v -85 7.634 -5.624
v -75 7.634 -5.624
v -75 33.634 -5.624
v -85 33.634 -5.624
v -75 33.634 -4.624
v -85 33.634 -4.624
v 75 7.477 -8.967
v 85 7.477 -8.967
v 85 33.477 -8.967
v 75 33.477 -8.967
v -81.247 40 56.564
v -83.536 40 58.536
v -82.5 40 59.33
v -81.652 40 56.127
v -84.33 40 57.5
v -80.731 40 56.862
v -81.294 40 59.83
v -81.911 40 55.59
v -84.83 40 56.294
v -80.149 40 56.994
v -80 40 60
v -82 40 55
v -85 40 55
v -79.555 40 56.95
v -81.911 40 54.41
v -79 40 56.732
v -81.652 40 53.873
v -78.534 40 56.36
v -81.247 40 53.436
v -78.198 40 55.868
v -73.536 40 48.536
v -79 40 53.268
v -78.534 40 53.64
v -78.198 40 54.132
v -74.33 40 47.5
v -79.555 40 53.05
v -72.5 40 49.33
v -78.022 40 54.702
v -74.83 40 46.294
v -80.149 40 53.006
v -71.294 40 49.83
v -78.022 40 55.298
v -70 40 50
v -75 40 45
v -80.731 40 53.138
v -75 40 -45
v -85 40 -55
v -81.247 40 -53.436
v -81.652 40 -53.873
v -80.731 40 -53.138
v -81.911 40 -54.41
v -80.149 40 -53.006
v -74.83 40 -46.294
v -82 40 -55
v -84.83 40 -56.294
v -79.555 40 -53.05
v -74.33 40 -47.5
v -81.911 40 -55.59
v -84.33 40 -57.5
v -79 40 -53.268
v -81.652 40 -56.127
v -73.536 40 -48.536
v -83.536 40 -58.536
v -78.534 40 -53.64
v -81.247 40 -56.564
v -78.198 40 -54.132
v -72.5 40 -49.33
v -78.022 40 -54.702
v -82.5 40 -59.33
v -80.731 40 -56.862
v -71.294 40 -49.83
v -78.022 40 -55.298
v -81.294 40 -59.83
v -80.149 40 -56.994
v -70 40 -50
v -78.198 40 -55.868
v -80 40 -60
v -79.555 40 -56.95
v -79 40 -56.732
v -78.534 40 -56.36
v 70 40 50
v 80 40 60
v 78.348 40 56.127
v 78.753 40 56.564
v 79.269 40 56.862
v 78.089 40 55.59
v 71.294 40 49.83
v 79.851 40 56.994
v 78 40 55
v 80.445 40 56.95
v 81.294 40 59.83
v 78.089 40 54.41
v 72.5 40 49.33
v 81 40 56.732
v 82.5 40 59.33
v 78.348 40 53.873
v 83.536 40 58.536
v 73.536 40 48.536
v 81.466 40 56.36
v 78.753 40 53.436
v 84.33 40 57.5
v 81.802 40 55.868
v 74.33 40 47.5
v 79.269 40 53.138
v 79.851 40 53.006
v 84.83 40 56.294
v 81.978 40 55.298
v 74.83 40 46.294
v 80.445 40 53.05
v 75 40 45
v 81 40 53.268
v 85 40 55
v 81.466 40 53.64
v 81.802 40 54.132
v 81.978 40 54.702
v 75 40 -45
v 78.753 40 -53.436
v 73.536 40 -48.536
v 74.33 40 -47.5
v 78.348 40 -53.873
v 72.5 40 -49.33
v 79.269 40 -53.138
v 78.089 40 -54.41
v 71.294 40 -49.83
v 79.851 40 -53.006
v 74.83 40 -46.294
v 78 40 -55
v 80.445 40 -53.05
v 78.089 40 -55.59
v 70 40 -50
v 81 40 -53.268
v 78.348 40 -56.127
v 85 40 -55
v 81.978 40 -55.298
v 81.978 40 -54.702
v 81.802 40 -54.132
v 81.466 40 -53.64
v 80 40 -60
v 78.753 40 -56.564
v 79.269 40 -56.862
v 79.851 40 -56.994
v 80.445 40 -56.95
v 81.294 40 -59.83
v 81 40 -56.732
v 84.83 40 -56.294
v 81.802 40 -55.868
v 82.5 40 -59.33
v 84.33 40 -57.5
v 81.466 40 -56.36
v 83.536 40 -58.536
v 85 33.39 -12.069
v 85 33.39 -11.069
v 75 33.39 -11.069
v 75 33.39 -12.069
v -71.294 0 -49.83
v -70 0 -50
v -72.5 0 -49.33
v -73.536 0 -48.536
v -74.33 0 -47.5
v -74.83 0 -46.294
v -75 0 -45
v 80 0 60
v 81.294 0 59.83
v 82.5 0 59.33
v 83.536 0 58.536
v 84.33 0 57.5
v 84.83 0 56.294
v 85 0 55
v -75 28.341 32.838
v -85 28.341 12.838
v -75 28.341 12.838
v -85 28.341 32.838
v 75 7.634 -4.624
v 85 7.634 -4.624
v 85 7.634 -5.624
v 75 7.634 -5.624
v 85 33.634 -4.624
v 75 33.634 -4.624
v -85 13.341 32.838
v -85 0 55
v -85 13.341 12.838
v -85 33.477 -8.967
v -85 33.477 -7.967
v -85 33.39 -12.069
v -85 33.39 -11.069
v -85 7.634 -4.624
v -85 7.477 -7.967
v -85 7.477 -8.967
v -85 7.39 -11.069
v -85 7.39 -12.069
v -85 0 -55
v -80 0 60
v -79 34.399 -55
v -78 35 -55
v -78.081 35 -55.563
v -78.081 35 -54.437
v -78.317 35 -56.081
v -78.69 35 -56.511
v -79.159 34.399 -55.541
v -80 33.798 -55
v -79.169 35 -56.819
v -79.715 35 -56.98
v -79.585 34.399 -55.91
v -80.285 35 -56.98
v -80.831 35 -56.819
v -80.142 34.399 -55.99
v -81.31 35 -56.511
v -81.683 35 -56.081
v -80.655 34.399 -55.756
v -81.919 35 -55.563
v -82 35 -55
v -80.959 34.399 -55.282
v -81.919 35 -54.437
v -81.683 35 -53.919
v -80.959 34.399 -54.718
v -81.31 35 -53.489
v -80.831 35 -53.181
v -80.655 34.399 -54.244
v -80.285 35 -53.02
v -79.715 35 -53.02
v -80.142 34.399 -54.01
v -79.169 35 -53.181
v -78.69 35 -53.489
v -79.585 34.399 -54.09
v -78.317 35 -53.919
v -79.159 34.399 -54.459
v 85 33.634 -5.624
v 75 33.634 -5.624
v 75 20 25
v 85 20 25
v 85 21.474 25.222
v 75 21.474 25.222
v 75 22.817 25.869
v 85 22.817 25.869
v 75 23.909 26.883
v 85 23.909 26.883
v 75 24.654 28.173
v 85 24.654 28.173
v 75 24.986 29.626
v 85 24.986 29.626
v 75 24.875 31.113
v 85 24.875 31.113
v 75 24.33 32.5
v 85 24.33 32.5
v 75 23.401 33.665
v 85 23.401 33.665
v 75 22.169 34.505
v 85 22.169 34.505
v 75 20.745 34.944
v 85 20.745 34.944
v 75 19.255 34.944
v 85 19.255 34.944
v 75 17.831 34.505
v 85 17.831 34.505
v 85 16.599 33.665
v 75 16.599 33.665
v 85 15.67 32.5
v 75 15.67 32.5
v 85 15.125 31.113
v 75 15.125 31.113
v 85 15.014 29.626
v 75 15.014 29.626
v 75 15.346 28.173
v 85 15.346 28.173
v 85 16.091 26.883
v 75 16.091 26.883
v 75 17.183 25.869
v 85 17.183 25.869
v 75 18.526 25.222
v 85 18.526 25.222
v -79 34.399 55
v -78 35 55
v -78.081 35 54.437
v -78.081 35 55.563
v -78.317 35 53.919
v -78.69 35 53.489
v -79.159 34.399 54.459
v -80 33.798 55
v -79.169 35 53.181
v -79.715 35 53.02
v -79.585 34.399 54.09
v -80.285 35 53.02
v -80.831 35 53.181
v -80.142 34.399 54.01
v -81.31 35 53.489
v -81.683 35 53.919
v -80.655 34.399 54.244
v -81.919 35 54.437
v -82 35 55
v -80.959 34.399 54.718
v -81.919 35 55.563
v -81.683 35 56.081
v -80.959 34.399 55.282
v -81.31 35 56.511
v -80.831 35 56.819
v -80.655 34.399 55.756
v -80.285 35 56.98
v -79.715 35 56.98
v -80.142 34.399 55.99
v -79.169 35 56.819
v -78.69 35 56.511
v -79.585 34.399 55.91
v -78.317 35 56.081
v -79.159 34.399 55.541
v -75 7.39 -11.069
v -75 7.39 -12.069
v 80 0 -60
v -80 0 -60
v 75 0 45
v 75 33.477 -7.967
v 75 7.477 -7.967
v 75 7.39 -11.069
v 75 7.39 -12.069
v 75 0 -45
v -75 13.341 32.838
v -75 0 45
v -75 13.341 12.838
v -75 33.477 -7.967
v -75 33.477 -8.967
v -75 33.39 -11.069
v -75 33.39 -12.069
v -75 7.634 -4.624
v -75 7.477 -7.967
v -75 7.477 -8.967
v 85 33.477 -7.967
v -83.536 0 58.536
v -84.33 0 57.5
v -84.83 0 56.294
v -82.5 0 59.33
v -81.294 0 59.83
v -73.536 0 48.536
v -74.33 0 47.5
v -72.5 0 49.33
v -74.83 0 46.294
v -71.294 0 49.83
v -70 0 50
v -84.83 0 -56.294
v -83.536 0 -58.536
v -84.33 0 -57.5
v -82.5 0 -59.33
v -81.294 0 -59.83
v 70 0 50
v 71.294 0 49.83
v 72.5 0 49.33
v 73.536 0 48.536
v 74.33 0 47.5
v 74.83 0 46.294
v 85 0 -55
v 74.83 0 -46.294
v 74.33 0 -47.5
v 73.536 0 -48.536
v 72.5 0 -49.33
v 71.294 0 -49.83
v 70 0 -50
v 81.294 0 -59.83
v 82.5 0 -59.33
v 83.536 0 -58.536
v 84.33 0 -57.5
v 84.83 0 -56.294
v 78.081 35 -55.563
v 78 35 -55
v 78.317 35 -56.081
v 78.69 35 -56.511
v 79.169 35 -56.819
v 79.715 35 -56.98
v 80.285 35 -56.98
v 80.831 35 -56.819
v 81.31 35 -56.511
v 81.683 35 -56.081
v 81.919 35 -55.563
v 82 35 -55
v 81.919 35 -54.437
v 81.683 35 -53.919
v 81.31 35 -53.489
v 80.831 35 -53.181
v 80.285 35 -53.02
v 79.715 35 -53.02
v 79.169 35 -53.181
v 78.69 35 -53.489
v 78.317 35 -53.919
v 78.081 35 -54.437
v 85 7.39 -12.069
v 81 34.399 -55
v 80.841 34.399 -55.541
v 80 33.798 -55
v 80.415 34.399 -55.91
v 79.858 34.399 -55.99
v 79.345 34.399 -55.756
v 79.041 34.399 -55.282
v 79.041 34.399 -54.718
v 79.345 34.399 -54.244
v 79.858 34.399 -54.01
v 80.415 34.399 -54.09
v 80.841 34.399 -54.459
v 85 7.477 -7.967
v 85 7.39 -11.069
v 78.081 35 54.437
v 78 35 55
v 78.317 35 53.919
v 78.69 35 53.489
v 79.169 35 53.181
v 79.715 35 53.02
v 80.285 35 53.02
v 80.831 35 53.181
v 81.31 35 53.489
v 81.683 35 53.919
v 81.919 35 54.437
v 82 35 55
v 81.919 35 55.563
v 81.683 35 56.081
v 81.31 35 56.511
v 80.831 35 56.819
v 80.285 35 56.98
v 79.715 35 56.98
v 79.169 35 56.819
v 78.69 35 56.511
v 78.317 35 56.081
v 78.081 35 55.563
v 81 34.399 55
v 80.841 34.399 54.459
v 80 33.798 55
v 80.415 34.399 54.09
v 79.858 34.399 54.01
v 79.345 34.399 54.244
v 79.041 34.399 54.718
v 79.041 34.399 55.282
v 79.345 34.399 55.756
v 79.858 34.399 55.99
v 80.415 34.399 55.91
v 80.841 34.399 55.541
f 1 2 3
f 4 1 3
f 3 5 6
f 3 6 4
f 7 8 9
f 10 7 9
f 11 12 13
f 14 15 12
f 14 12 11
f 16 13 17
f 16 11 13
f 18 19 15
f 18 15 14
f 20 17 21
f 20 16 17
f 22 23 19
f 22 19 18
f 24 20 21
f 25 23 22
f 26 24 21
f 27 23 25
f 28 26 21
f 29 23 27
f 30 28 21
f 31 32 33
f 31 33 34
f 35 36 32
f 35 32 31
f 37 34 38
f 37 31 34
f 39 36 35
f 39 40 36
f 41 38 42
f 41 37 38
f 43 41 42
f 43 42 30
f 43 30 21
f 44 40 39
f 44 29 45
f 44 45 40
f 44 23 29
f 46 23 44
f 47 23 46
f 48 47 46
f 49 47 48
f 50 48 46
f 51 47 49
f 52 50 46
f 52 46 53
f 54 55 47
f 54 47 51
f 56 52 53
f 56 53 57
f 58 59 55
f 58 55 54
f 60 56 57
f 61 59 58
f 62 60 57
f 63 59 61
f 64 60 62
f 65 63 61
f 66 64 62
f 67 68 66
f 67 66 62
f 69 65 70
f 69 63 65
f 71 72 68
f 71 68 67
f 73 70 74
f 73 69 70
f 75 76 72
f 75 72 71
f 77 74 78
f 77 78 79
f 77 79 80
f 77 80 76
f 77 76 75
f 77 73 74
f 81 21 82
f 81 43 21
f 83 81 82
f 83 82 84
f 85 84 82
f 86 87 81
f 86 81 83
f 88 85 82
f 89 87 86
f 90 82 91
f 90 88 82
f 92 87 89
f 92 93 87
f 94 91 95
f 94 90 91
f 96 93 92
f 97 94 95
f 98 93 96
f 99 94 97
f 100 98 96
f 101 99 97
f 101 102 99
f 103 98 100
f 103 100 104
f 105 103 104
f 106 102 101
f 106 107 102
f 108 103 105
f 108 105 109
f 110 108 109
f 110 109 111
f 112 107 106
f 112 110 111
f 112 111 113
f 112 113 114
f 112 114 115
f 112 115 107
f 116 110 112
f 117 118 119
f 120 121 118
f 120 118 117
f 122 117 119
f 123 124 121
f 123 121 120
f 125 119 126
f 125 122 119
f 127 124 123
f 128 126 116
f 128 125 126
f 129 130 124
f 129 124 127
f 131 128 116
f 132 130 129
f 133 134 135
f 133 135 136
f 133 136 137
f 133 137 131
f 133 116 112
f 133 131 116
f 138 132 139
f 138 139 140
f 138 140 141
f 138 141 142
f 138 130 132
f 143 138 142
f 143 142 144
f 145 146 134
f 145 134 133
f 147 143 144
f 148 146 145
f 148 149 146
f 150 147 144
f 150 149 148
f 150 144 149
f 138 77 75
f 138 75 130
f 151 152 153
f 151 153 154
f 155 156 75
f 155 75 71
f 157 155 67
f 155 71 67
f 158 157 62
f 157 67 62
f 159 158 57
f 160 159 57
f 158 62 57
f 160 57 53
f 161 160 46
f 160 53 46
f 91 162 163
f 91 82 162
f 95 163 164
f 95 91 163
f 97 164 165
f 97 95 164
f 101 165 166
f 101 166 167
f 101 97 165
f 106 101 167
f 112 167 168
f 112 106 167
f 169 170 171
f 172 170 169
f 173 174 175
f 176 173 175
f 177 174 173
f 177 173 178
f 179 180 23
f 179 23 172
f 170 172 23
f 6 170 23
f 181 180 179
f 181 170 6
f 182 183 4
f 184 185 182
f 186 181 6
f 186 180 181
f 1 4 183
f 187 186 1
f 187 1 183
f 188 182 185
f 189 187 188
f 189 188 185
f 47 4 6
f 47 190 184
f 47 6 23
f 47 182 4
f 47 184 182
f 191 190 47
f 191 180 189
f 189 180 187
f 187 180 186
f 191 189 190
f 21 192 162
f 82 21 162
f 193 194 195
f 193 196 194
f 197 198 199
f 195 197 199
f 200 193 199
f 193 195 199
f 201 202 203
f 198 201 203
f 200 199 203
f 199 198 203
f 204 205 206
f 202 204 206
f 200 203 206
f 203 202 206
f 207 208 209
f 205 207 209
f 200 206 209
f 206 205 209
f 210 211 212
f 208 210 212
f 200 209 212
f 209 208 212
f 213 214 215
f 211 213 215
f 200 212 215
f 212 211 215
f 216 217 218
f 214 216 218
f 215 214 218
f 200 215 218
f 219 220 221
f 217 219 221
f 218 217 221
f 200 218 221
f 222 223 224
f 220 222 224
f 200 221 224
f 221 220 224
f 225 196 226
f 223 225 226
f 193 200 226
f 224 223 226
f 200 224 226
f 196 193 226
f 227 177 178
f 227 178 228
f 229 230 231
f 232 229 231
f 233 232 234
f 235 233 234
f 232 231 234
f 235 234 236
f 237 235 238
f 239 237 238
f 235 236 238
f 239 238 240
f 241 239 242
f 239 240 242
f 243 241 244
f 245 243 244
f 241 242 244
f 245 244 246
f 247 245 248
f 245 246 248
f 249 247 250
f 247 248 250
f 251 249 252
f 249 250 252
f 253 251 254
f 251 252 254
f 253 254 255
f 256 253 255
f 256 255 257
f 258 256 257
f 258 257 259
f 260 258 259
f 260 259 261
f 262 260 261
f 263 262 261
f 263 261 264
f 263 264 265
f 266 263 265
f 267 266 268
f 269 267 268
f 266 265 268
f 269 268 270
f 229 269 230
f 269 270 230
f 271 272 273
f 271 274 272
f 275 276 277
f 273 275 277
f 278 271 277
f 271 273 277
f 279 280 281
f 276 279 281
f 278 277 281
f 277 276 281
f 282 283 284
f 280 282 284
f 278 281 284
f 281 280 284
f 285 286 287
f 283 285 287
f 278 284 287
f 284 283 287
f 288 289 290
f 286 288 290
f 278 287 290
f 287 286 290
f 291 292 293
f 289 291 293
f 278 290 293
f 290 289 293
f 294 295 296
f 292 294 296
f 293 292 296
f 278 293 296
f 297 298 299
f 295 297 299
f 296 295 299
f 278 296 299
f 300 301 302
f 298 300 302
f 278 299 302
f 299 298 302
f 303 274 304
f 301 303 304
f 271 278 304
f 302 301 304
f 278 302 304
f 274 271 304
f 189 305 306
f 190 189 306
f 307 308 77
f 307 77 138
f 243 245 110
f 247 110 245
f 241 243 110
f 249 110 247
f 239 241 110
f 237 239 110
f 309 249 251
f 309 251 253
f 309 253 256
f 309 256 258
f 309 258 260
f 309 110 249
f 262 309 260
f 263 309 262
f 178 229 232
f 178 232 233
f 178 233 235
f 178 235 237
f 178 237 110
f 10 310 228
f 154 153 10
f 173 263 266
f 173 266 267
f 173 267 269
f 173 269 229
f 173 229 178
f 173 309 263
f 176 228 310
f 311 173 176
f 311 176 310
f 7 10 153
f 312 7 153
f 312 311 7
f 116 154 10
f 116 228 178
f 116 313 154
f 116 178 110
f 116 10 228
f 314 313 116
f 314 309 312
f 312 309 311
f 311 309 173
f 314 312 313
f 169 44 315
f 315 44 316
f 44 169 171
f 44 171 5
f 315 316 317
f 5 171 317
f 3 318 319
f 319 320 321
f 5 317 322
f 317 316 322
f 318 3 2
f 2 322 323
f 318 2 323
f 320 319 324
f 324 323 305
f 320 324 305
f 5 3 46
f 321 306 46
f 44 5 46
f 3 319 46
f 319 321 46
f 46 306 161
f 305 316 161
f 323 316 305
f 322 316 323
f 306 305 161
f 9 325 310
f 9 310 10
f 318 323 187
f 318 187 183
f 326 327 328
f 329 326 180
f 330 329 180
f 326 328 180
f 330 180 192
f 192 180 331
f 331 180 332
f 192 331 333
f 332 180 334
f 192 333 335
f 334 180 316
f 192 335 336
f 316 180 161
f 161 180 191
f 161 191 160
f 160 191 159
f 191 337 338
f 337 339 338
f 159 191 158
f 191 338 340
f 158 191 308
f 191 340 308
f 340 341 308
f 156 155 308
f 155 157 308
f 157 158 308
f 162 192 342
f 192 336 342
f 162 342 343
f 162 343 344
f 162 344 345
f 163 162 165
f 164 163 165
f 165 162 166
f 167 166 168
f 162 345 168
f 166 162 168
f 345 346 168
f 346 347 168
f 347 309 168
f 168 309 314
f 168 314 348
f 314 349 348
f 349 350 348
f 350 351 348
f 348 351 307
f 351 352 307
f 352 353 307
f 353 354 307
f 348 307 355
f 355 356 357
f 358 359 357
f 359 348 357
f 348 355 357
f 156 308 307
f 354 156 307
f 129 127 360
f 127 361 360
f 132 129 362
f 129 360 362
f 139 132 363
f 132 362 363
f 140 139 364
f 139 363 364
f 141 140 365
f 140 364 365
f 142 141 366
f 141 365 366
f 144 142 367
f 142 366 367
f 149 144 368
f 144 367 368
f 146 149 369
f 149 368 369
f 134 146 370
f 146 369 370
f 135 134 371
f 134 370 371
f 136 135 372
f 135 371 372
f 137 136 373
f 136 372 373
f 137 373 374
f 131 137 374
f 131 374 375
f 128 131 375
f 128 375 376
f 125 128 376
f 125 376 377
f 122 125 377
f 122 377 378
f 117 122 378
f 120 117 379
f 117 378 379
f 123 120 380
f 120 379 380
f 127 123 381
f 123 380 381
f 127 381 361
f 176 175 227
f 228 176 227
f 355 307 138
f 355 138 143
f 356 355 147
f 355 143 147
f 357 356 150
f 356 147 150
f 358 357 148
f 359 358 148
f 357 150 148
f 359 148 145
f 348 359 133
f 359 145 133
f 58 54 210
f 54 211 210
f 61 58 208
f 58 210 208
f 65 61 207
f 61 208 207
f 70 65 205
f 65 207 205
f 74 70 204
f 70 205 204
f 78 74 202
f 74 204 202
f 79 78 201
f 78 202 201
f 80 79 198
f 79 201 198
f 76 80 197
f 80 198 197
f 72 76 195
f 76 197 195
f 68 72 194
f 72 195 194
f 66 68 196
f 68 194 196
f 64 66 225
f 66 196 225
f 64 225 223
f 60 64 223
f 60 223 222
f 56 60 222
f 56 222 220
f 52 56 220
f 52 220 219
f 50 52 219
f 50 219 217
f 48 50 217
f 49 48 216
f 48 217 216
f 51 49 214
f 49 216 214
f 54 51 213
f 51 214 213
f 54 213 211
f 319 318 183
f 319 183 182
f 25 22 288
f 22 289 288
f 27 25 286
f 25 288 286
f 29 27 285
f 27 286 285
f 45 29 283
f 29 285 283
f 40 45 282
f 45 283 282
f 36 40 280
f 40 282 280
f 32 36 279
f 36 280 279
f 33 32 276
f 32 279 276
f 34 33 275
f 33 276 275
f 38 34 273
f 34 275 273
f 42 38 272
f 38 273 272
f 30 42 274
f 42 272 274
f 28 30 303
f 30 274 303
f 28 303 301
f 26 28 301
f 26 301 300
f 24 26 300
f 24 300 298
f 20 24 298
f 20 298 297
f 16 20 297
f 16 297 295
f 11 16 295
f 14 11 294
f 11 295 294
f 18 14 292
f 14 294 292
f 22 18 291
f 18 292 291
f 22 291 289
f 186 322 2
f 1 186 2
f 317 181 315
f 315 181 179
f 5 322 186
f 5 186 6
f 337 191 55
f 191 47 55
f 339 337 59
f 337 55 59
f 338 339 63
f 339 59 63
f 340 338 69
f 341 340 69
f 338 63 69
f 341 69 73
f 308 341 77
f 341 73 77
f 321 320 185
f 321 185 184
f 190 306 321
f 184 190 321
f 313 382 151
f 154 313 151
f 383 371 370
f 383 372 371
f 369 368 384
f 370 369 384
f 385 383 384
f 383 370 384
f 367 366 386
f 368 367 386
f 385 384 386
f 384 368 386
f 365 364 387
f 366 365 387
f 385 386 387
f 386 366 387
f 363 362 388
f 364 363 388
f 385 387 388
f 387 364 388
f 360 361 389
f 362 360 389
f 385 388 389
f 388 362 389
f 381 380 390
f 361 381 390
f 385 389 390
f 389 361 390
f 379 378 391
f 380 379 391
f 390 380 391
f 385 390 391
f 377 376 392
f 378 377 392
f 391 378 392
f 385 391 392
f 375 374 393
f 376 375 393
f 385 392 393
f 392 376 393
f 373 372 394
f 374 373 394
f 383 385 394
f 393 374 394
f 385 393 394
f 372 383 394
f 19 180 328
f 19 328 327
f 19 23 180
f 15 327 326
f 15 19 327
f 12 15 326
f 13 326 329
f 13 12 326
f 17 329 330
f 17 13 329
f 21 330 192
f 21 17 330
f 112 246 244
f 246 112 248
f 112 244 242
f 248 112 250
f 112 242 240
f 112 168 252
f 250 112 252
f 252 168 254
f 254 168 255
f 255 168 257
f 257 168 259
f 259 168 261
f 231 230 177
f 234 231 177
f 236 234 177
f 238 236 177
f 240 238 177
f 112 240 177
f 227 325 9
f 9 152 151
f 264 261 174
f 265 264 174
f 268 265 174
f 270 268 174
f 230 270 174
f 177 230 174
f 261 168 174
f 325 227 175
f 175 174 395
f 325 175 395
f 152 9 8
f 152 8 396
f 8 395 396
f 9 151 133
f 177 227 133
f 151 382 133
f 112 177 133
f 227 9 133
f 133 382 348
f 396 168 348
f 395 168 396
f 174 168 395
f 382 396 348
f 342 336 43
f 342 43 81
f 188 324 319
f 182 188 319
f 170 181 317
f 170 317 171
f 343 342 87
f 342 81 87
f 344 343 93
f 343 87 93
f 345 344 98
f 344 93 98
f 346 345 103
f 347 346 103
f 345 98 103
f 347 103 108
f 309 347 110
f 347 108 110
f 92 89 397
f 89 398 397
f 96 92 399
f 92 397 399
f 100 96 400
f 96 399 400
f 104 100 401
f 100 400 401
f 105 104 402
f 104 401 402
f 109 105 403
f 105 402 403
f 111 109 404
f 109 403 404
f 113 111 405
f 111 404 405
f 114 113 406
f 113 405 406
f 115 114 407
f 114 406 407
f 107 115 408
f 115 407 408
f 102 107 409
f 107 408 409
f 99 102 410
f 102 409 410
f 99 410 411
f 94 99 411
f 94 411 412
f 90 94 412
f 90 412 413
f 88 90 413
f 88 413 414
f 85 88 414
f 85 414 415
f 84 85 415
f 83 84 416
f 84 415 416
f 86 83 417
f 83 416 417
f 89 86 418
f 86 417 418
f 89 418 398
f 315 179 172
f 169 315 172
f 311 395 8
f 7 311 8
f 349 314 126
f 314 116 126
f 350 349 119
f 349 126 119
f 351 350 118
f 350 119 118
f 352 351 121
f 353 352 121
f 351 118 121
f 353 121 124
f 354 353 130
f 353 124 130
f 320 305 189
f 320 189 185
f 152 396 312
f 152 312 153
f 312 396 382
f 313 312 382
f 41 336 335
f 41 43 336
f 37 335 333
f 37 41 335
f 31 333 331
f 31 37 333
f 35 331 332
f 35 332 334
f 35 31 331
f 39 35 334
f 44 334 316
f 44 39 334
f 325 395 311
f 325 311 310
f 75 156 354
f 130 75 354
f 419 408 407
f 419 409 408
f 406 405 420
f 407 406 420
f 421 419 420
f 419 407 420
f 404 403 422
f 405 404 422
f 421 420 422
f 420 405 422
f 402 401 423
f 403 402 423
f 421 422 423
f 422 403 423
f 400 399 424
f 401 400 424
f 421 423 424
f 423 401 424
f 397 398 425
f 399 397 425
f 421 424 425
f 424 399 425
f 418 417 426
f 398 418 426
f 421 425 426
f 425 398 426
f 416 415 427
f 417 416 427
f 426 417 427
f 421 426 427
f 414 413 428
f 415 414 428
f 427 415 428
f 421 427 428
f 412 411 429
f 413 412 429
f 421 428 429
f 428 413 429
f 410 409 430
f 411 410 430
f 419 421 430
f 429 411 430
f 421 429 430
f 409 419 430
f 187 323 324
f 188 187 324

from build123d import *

# Parameters (mm, degrees)
SKETCH1_W                 = 170
SKETCH1_H                 = 120
SKETCH1_W_2               = 150
SKETCH1_H_2               = 100
EXTRUDE_THIN1_DEPTH       = 40
SKETCH2_R                 = 5
CUT_EXTRUDE1_DEPTH        = 10
F_4_0MM_DOWEL_HOLE1_D     = 4
F_4_0MM_DOWEL_HOLE1_DEPTH = 5
F_4_0MM_DOWEL_HOLE1_TIP   = 1.201721238
F_4_0MM_DOWEL_HOLE2_D     = 4
F_4_0MM_DOWEL_HOLE2_DEPTH = 5
F_4_0MM_DOWEL_HOLE2_TIP   = 1.201721238
F_4_0MM_DOWEL_HOLE3_D     = 4
F_4_0MM_DOWEL_HOLE3_DEPTH = 5
F_4_0MM_DOWEL_HOLE3_TIP   = 1.201721238
F_4_0MM_DOWEL_HOLE4_D     = 4
F_4_0MM_DOWEL_HOLE4_DEPTH = 5
F_4_0MM_DOWEL_HOLE4_TIP   = 1.201721238
SKETCH15_W                = 20
SKETCH15_H                = 15
CUT_EXTRUDE7_DEPTH        = 10
FILLET1_R                 = 5
SKETCH16_W                = 1
SKETCH16_H                = 26
CUT_EXTRUDE8_DEPTH        = 1
CUT_EXTRUDE8_DEPTH_BACK   = 171
SKETCH17_W                = 1
SKETCH17_H                = 26
CUT_EXTRUDE9_DEPTH        = 1
CUT_EXTRUDE9_DEPTH_BACK   = 171
SKETCH19_W                = 1
SKETCH19_H                = 26
CUT_EXTRUDE10_DEPTH       = 1
CUT_EXTRUDE10_DEPTH_BACK  = 171
FILLET2_R                 = 5


with BuildPart() as part:
    # Sketch1 → Extrude-Thin1 (new body)
    with BuildSketch(Plane(origin=(0, 0, 0), x_dir=(1, 0, 0), z_dir=(0, 1, 0))):
        Rectangle(SKETCH1_W, SKETCH1_H)
        Rectangle(SKETCH1_W_2, SKETCH1_H_2, mode=Mode.SUBTRACT)
    extrude(amount=EXTRUDE_THIN1_DEPTH)

    # Sketch2 → Cut-Extrude1 (cut)
    with BuildSketch(Plane(origin=(85, 0, 0), x_dir=(0, 0, -1), z_dir=(1, 0, 0))):
        with Locations((-30, 20)):
            Circle(SKETCH2_R)
    extrude(amount=-CUT_EXTRUDE1_DEPTH, mode=Mode.SUBTRACT)

    # Ø4.0mm Dowel Hole1
    with Locations(Plane(origin=(0, 40, 0), x_dir=(1, 0, 0), z_dir=(0, 1, 0))):
        with Locations((-80, 55)):
            Hole(F_4_0MM_DOWEL_HOLE1_D / 2, depth=F_4_0MM_DOWEL_HOLE1_DEPTH)
            with Locations((0, 0, -(F_4_0MM_DOWEL_HOLE1_DEPTH + F_4_0MM_DOWEL_HOLE1_TIP / 2))):  # 118° drill point
                Cone(0, F_4_0MM_DOWEL_HOLE1_D / 2, F_4_0MM_DOWEL_HOLE1_TIP, mode=Mode.SUBTRACT)

    # Ø4.0mm Dowel Hole2
    with Locations(Plane(origin=(0, 40, 0), x_dir=(1, 0, 0), z_dir=(0, 1, 0))):
        with Locations((-80, -55)):
            Hole(F_4_0MM_DOWEL_HOLE2_D / 2, depth=F_4_0MM_DOWEL_HOLE2_DEPTH)
            with Locations((0, 0, -(F_4_0MM_DOWEL_HOLE2_DEPTH + F_4_0MM_DOWEL_HOLE2_TIP / 2))):  # 118° drill point
                Cone(0, F_4_0MM_DOWEL_HOLE2_D / 2, F_4_0MM_DOWEL_HOLE2_TIP, mode=Mode.SUBTRACT)

    # Ø4.0mm Dowel Hole3
    with Locations(Plane(origin=(0, 40, 0), x_dir=(1, 0, 0), z_dir=(0, 1, 0))):
        with Locations((80, -55)):
            Hole(F_4_0MM_DOWEL_HOLE3_D / 2, depth=F_4_0MM_DOWEL_HOLE3_DEPTH)
            with Locations((0, 0, -(F_4_0MM_DOWEL_HOLE3_DEPTH + F_4_0MM_DOWEL_HOLE3_TIP / 2))):  # 118° drill point
                Cone(0, F_4_0MM_DOWEL_HOLE3_D / 2, F_4_0MM_DOWEL_HOLE3_TIP, mode=Mode.SUBTRACT)

    # Ø4.0mm Dowel Hole4
    with Locations(Plane(origin=(0, 40, 0), x_dir=(1, 0, 0), z_dir=(0, 1, 0))):
        with Locations((80, 55)):
            Hole(F_4_0MM_DOWEL_HOLE4_D / 2, depth=F_4_0MM_DOWEL_HOLE4_DEPTH)
            with Locations((0, 0, -(F_4_0MM_DOWEL_HOLE4_DEPTH + F_4_0MM_DOWEL_HOLE4_TIP / 2))):  # 118° drill point
                Cone(0, F_4_0MM_DOWEL_HOLE4_D / 2, F_4_0MM_DOWEL_HOLE4_TIP, mode=Mode.SUBTRACT)

    # Sketch15 → Cut-Extrude7 (cut)
    with BuildSketch(Plane.ZY.offset(85)):
        with Locations((22.837644719, 20.840649499)):
            Rectangle(SKETCH15_W, SKETCH15_H)
    extrude(amount=-CUT_EXTRUDE7_DEPTH, mode=Mode.SUBTRACT)

    # Fillet1
    fillet1_edges = [part.edges().sort_by_distance(p)[0] for p in [
        (85, 20, 60),
        (-85, 20, 60),
        (-85, 20, -60),
        (85, 20, -60),
    ]]
    fillet(fillet1_edges, radius=FILLET1_R)

    # Sketch16 → Cut-Extrude8 (cut, two sides)
    with BuildSketch(Plane(origin=(85, 0, 0), x_dir=(0, 0, -1), z_dir=(1, 0, 0))) as cut_extrude8_sk:
        with Locations((5.123572244, 20.634211022)):
            Rectangle(SKETCH16_W, SKETCH16_H)
    extrude(amount=CUT_EXTRUDE8_DEPTH, mode=Mode.SUBTRACT)
    extrude(cut_extrude8_sk.sketch, amount=-CUT_EXTRUDE8_DEPTH_BACK, mode=Mode.SUBTRACT)

    # Sketch17 → Cut-Extrude9 (cut, two sides)
    with BuildSketch(Plane(origin=(85, 0, 0), x_dir=(0, 0, -1), z_dir=(1, 0, 0))) as cut_extrude9_sk:
        with Locations((8.466927988, 20.476753878)):
            Rectangle(SKETCH17_W, SKETCH17_H)
    extrude(amount=CUT_EXTRUDE9_DEPTH, mode=Mode.SUBTRACT)
    extrude(cut_extrude9_sk.sketch, amount=-CUT_EXTRUDE9_DEPTH_BACK, mode=Mode.SUBTRACT)

    # Sketch19 → Cut-Extrude10 (cut, two sides)
    with BuildSketch(Plane(origin=(85, 0, 0), x_dir=(0, 0, -1), z_dir=(1, 0, 0))) as cut_extrude10_sk:
        with Locations((11.568551735, 20.390257517)):
            Rectangle(SKETCH19_W, SKETCH19_H)
    extrude(amount=CUT_EXTRUDE10_DEPTH, mode=Mode.SUBTRACT)
    extrude(cut_extrude10_sk.sketch, amount=-CUT_EXTRUDE10_DEPTH_BACK, mode=Mode.SUBTRACT)

    # Fillet2
    fillet2_edges = [part.edges().sort_by_distance(p)[0] for p in [
        (75, 20, 50),
        (75, 20, -50),
        (-75, 20, -50),
        (-75, 20, 50),
    ]]
    fillet(fillet2_edges, radius=FILLET2_R)


solid = part.part
